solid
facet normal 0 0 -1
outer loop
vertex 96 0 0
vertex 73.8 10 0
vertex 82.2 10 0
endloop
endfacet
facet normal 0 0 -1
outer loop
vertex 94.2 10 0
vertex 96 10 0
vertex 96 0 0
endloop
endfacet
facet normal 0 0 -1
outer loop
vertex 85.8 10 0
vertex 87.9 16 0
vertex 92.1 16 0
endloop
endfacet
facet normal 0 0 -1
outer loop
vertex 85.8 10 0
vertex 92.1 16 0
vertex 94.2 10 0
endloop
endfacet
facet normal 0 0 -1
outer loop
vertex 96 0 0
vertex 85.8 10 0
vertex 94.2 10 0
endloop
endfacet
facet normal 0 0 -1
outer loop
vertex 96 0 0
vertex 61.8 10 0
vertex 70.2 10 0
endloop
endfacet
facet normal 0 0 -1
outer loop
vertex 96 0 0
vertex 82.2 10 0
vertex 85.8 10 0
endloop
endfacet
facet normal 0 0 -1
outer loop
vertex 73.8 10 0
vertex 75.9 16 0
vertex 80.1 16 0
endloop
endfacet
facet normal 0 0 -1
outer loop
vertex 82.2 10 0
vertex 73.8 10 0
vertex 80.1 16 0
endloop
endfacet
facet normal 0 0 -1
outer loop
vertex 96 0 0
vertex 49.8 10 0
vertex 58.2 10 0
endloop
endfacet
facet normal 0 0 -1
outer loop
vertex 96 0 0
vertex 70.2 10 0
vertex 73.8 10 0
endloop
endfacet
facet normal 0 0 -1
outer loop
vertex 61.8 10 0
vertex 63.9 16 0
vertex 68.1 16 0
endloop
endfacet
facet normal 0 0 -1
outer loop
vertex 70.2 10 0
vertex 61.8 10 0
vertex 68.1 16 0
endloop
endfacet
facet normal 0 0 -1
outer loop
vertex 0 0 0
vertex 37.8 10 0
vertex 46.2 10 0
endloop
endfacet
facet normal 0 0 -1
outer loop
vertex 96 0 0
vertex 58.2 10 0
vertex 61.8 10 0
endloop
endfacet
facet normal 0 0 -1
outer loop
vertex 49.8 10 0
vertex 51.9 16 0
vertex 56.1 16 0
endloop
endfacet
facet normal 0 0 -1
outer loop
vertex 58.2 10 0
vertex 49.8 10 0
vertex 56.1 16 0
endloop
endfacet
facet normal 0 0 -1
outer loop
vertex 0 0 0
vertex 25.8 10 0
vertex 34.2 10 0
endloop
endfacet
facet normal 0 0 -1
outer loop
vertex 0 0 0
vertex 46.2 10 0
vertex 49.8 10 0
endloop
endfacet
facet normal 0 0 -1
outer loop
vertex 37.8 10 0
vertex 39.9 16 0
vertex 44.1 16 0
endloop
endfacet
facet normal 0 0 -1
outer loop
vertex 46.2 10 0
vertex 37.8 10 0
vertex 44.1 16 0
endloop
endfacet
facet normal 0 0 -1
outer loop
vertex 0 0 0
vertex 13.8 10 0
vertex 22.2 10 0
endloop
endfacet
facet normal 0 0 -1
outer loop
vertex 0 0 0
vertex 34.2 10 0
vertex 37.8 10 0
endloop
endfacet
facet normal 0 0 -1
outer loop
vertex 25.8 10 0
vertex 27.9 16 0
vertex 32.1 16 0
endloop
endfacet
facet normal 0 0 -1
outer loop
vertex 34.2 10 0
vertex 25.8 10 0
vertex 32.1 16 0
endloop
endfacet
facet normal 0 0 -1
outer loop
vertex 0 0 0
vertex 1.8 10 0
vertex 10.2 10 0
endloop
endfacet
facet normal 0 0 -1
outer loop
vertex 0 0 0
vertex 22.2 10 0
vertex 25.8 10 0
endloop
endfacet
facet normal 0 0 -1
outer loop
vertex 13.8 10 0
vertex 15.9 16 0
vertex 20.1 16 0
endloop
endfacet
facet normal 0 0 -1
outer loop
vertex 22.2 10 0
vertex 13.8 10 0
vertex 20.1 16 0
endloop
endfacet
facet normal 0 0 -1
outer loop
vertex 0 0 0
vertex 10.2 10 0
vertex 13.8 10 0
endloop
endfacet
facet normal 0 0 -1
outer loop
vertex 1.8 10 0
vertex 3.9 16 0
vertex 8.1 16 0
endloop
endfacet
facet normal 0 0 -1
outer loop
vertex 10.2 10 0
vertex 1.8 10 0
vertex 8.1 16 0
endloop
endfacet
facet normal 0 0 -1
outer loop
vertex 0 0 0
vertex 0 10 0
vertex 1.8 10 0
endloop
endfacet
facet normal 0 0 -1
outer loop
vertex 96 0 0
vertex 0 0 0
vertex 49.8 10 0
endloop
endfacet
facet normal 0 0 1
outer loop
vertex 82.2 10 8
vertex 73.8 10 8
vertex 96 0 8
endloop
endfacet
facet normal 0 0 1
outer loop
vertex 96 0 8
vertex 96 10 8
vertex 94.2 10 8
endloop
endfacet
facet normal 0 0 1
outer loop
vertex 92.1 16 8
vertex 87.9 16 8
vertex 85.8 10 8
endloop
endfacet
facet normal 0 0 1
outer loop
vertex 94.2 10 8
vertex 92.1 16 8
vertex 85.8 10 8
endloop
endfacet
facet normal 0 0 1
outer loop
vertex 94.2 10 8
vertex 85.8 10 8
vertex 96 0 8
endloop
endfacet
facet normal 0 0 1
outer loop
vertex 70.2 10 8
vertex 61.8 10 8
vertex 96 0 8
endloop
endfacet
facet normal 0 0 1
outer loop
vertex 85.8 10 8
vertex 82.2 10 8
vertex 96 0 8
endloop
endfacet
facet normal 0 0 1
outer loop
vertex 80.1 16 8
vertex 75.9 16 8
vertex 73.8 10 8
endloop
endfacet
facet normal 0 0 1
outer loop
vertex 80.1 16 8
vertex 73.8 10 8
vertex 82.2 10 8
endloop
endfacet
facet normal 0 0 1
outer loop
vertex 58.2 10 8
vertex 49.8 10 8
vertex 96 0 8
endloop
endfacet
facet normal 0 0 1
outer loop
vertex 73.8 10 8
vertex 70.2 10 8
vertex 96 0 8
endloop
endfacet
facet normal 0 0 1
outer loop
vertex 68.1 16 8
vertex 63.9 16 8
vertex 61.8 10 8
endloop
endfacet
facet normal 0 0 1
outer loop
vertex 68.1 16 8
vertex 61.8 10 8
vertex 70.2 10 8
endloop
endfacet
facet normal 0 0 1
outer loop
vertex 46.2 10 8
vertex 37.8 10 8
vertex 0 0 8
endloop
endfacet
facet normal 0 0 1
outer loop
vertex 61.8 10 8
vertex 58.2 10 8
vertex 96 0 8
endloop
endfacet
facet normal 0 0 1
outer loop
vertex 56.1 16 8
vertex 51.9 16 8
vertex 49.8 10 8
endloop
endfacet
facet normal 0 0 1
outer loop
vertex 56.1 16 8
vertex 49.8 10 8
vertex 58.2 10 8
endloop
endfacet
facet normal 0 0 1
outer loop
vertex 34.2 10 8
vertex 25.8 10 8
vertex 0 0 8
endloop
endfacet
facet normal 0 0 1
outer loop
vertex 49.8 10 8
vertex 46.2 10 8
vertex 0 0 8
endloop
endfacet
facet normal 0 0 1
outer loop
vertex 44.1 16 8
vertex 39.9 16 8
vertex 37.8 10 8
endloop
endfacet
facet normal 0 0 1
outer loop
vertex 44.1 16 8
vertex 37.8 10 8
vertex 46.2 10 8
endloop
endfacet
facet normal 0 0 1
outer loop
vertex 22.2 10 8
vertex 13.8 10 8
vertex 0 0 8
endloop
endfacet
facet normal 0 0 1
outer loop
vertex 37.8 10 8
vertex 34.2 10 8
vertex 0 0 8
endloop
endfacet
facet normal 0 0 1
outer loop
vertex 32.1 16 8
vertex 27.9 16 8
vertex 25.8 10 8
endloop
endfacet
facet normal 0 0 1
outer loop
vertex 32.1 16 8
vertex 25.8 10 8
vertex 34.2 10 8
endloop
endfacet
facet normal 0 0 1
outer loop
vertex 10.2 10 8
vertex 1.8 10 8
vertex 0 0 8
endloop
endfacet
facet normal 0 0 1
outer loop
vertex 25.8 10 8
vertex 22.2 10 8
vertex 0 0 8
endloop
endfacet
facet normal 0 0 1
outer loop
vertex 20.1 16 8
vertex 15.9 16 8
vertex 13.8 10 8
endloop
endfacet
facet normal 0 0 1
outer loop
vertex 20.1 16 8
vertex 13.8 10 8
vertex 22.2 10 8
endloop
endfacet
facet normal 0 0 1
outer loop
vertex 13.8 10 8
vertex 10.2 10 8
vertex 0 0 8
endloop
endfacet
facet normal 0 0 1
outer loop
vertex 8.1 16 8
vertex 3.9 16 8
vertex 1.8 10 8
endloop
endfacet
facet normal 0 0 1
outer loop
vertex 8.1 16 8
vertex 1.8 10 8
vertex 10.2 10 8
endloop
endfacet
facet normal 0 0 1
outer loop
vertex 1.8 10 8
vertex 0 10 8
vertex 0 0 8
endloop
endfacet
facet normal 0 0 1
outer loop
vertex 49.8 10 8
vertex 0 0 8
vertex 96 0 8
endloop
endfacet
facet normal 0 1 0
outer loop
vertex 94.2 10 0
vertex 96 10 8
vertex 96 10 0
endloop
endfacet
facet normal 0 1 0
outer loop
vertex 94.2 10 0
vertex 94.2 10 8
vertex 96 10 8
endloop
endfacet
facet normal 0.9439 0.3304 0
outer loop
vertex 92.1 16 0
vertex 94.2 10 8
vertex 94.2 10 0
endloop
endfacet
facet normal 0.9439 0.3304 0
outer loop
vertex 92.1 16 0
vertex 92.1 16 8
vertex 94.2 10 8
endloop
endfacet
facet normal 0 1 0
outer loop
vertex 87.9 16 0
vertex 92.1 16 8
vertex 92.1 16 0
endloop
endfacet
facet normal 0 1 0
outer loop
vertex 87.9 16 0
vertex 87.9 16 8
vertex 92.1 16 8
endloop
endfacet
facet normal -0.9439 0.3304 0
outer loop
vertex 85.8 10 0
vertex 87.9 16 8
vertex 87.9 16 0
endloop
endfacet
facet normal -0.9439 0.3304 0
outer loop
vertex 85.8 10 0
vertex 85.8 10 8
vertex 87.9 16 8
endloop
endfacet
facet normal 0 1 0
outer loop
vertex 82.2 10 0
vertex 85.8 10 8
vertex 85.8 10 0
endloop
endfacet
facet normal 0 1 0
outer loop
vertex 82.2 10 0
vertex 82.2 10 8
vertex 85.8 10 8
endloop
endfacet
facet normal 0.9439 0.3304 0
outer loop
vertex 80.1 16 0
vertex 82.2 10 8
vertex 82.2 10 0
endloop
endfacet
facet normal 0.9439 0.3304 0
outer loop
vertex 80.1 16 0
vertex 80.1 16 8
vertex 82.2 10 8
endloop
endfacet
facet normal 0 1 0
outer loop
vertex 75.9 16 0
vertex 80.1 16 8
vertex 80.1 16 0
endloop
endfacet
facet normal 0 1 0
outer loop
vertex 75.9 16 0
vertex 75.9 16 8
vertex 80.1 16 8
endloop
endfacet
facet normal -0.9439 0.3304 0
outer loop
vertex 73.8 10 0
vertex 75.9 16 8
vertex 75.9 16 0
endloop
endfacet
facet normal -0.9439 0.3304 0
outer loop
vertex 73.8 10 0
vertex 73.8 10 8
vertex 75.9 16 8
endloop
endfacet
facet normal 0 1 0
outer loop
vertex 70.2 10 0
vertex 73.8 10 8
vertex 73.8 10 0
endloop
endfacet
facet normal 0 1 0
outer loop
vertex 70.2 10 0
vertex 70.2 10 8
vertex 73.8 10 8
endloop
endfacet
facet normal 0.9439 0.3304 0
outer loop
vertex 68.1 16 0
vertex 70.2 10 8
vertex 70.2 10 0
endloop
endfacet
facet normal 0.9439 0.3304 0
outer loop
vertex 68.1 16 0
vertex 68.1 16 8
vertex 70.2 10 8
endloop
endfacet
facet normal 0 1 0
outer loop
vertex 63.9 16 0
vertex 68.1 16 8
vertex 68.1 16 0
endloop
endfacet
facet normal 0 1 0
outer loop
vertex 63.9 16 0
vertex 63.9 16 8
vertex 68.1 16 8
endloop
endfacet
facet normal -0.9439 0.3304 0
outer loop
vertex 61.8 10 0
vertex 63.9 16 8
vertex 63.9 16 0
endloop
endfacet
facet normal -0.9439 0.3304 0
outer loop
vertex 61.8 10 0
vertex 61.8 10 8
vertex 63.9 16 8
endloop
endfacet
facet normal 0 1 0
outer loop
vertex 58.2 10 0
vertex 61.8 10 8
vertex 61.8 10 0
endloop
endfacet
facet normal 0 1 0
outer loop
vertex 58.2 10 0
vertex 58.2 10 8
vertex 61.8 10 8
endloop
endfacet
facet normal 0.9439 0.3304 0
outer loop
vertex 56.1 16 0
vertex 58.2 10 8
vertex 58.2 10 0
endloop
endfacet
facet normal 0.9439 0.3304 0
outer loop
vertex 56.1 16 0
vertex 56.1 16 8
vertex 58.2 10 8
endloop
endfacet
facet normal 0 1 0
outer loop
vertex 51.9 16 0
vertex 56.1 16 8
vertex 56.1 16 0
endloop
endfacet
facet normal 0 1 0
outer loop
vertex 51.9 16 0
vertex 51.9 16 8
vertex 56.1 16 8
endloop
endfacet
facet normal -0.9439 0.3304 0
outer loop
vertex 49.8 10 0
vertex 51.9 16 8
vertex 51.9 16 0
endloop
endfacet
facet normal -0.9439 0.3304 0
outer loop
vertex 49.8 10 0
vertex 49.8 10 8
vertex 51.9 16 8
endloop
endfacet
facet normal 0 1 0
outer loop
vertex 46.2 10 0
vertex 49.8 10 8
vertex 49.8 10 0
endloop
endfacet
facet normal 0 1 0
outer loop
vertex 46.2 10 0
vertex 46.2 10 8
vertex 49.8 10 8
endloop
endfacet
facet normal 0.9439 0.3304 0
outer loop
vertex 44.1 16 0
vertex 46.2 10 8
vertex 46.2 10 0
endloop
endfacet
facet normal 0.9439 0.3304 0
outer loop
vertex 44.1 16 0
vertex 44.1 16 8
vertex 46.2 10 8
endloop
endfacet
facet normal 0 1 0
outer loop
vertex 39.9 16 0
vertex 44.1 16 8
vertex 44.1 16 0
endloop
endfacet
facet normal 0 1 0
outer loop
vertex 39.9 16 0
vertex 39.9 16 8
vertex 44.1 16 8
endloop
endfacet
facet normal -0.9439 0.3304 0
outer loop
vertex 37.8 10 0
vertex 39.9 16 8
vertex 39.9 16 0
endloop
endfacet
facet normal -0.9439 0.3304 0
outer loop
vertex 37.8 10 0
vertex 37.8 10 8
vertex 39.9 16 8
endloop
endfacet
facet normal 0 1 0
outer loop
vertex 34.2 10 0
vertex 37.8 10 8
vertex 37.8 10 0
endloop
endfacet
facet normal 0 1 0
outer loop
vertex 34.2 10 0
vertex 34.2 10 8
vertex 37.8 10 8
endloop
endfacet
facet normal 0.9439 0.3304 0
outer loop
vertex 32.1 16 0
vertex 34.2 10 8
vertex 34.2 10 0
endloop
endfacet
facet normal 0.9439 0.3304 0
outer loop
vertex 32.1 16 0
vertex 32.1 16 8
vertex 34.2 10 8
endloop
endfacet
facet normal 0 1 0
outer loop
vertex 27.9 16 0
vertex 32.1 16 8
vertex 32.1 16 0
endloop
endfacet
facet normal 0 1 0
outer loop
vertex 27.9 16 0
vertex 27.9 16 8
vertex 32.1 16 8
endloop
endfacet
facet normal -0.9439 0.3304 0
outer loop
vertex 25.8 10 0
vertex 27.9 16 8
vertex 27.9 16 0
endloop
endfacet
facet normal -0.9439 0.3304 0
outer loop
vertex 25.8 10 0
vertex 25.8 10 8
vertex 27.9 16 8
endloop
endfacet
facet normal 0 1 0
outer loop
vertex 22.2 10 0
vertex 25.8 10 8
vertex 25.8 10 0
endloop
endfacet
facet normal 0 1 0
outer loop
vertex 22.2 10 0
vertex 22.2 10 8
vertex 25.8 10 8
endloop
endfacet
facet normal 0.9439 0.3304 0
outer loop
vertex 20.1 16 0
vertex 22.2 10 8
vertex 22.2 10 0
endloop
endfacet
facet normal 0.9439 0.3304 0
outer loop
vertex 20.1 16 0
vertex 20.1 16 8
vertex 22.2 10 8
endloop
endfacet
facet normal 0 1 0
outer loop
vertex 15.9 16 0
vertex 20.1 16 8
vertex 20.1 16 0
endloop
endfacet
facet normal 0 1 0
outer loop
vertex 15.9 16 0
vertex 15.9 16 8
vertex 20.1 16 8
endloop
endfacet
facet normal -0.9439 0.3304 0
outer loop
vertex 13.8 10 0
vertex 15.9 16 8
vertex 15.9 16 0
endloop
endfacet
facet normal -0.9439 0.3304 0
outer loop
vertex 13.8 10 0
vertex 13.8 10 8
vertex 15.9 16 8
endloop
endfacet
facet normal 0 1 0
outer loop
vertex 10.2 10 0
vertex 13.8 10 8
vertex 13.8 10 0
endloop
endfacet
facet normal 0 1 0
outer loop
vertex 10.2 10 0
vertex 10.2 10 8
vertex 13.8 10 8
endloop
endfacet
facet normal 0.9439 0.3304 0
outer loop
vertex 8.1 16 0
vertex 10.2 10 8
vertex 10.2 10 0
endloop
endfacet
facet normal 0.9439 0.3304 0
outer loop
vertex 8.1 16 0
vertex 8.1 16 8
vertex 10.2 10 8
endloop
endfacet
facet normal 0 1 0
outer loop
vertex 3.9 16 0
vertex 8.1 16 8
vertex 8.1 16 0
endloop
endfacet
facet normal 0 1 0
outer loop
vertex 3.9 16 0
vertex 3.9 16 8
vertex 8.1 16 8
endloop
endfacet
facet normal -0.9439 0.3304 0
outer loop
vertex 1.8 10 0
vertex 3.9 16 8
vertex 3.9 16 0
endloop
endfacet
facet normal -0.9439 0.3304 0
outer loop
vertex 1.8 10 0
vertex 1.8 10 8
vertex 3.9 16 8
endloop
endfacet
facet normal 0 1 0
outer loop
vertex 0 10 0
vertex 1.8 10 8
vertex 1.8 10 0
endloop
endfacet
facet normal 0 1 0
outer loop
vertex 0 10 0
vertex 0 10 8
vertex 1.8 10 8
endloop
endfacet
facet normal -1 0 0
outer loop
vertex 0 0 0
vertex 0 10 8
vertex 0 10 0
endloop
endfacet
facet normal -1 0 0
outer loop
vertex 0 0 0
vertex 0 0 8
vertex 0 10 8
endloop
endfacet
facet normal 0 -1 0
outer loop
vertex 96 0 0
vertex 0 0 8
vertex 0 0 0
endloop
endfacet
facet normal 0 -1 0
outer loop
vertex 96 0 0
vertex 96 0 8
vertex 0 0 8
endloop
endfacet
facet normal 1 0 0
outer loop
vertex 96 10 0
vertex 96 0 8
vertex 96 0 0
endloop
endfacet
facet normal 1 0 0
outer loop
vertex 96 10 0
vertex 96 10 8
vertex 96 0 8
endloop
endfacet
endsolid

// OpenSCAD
$fn = 32;

// ----------------------------------------------------------------------
// Gear rack: 8 teeth, pitch 12 mm
// ----------------------------------------------------------------------

// --- parameters (mm) ---
teeth = 8;                // number of teeth
pitch = 12;               // tooth pitch, X
root_w = 8.4;             // tooth width at the root
tip_w = 4.2;              // tooth width at the tip
base_h = 10;              // rack body height, Y
tooth_h = 6;              // tooth height above the body
plate_t = 8;              // rack width, Z (extrusion height)

rack_l = teeth * pitch;  // overall length
total_h = base_h + tooth_h;  // overall height

profile = [[0, 0], [96, 0], [96, 10], [94.2, 10], [92.1, 16], [87.9, 16], [85.8, 10], [82.2, 10], [80.1, 16], [75.9, 16], [73.8, 10], [70.2, 10], [68.1, 16], [63.9, 16], [61.8, 10], [58.2, 10], [56.1, 16], [51.9, 16], [49.8, 10], [46.2, 10], [44.1, 16], [39.9, 16], [37.8, 10], [34.2, 10], [32.1, 16], [27.9, 16], [25.8, 10], [22.2, 10], [20.1, 16], [15.9, 16], [13.8, 10], [10.2, 10], [8.1, 16], [3.9, 16], [1.8, 10], [0, 10]];  // primary outline, 36 points, counter clockwise

// --- the one profile operation ---
linear_extrude(height = plate_t) polygon(points = profile);
